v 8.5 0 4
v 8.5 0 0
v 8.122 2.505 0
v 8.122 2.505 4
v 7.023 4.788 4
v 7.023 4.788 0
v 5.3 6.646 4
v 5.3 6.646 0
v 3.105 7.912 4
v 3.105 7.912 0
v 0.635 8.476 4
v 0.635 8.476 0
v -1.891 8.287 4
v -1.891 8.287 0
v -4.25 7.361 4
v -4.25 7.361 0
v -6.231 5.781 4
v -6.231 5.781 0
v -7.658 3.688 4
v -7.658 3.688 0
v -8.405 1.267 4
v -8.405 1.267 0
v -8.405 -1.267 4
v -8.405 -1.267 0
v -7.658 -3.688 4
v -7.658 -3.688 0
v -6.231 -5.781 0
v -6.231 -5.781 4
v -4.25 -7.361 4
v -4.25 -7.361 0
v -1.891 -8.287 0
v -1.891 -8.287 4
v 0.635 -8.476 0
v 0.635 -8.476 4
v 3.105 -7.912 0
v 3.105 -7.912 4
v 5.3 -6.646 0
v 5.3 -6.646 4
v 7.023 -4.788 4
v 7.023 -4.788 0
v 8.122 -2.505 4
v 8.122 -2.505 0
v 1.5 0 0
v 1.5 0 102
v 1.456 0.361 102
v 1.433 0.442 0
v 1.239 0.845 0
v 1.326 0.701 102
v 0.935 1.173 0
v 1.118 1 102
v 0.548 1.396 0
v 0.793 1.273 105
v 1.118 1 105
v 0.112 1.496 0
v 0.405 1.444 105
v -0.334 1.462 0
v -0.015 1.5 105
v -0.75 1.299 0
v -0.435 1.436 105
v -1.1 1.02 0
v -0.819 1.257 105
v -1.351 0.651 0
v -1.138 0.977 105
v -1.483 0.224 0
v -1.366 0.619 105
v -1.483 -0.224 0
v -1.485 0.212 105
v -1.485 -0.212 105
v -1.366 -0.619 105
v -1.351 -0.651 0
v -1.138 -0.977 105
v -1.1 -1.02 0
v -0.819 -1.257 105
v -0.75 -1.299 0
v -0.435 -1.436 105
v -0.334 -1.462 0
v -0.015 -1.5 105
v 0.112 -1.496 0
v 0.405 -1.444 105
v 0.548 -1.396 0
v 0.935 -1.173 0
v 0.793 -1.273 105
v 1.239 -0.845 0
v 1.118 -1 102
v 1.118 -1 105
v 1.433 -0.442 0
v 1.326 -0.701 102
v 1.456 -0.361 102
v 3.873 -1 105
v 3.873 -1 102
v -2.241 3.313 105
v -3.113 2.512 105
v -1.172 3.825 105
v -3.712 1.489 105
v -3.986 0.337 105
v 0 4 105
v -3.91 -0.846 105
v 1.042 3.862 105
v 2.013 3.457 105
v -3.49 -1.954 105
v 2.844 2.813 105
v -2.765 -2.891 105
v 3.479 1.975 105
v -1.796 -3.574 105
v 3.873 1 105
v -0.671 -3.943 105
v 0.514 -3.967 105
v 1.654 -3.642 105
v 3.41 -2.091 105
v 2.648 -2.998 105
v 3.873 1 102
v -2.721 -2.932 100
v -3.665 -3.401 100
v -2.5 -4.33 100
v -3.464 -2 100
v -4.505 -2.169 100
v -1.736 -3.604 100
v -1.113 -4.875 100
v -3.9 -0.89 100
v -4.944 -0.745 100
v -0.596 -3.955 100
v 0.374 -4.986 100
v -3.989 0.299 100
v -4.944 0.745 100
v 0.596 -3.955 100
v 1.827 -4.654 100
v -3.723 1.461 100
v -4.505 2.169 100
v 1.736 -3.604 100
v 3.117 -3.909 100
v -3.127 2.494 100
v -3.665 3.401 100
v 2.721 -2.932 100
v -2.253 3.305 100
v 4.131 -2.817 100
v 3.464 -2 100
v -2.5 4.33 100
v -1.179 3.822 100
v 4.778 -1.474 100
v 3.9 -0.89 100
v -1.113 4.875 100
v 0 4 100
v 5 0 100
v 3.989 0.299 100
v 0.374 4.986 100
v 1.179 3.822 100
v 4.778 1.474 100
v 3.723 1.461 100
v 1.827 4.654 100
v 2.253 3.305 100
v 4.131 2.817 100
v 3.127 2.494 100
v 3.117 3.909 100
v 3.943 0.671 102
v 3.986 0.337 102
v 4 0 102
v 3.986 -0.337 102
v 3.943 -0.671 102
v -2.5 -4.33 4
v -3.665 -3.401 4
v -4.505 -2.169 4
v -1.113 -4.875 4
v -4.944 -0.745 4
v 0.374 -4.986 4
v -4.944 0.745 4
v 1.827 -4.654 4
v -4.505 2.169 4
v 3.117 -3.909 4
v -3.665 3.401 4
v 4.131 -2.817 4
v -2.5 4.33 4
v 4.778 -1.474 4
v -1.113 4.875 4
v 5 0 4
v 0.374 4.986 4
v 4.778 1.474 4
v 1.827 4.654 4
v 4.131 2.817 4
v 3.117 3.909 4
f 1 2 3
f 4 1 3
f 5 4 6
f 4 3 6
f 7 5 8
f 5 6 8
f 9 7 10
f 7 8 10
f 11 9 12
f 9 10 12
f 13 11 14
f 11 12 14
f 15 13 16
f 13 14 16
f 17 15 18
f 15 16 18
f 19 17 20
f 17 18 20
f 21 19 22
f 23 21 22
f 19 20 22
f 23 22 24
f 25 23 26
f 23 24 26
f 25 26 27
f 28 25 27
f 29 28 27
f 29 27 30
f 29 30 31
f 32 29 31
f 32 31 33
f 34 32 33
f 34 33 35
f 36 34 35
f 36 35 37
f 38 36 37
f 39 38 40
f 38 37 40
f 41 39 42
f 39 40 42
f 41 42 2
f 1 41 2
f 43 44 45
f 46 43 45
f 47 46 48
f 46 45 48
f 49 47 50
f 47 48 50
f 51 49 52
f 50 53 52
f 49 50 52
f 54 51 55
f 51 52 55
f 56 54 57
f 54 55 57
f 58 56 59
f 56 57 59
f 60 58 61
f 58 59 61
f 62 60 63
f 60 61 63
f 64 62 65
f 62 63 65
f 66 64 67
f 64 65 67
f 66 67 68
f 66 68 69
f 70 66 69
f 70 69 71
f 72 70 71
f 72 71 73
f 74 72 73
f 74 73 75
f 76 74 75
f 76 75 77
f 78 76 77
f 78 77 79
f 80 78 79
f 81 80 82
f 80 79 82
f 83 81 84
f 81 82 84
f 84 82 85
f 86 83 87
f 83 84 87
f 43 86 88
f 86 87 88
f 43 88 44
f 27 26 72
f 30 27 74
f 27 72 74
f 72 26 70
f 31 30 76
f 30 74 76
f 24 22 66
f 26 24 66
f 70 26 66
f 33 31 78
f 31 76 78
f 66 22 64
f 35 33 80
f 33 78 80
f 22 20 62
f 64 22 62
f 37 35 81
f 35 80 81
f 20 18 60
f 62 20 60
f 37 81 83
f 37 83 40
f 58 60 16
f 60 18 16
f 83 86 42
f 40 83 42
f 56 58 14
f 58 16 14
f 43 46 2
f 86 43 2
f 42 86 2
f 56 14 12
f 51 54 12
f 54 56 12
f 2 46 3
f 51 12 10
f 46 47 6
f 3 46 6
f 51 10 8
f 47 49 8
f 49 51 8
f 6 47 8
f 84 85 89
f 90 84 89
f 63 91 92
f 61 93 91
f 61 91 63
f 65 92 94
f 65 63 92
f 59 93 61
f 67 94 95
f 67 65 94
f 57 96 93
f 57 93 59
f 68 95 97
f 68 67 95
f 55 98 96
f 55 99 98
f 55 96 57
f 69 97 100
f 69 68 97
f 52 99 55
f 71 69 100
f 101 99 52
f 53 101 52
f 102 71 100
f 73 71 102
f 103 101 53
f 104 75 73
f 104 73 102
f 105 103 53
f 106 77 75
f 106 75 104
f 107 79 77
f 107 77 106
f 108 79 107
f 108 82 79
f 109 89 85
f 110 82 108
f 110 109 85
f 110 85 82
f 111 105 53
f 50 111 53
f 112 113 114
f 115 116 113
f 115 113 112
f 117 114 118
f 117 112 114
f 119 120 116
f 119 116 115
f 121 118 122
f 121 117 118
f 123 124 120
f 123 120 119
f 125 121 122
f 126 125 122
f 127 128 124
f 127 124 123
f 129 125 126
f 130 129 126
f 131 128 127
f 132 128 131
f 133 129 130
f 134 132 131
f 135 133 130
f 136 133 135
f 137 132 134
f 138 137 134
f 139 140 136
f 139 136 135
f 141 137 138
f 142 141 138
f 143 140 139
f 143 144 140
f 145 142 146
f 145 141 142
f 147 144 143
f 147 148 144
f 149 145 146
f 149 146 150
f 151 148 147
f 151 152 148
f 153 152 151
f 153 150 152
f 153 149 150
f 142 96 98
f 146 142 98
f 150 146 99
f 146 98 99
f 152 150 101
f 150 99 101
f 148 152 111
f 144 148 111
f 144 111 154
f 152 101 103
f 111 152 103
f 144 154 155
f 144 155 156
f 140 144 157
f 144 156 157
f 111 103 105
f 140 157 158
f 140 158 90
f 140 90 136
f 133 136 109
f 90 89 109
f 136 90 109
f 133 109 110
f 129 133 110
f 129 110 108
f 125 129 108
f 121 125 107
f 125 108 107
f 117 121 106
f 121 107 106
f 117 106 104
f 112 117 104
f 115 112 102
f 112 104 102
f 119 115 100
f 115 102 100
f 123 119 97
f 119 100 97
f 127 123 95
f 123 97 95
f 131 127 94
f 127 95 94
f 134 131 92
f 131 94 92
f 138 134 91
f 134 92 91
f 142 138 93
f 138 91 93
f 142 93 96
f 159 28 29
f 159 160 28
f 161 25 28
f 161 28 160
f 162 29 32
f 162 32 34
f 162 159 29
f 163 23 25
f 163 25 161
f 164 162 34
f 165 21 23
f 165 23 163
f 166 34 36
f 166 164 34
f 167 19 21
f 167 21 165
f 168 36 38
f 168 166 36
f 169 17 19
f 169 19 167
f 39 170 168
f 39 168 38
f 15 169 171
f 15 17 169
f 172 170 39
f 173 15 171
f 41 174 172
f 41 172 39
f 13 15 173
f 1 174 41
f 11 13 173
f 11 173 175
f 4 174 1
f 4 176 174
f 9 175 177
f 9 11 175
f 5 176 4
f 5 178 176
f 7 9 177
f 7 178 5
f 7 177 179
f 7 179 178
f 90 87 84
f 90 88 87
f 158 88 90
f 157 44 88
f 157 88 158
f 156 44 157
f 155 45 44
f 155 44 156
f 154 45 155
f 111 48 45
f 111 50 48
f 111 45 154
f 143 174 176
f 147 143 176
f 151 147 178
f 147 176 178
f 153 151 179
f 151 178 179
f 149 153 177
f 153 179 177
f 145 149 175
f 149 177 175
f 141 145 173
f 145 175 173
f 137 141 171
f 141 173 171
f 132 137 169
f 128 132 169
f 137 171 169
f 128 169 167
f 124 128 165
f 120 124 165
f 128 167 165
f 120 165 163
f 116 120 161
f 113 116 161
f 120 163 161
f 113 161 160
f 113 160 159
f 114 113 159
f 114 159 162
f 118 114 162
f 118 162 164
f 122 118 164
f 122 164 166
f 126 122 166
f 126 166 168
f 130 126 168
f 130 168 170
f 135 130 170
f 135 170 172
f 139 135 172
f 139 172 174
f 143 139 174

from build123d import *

# Parameters (mm, degrees)
F0_R      = 8.5
F1_DEPTH  = 4
F3_R      = 5
F4_DEPTH  = 100
F5_W      = 4
F5_H      = 5
F9_DEPTH  = 3
F10_R     = 1.5
F11_DEPTH = 118.9


with BuildPart() as f1:
    # F0 (on Top) → F1 (new body)
    with BuildSketch(Plane.XY):
        Circle(F0_R)
    extrude(amount=F1_DEPTH)

    # F3 (on Top) → F4 (join)
    with BuildSketch(Plane.XY):
        Circle(F3_R)
    extrude(amount=F4_DEPTH)

    # F5 (on Right) → F6 (revolve)
    with BuildSketch(Plane.YZ):
        with Locations((2, 102.5)):
            Rectangle(F5_W, F5_H)
    revolve(axis=Axis((0, 0, 102.5), (0, 0, -1)))

    # F8 (on face) → F9 (cut)
    with BuildSketch(Plane.XY.offset(105)):
        with BuildLine():
            Line((3.8729833462, 1), (1, 1))
            Line((1, 1), (1, -1))
            Line((1, -1), (3.8729833462, -1))
            ThreePointArc((3.8729833462, -1), (3.9681187851, -0.5040171699), (4, 0))
            ThreePointArc((4, 0), (3.9681187851, 0.5040171699), (3.8729833462, 1))
        make_face()
    extrude(amount=-F9_DEPTH, mode=Mode.SUBTRACT)

    # F10 (on face) → F11 (cut)
    with BuildSketch(Plane.XY.offset(105)):
        Circle(F10_R)
    extrude(amount=-F11_DEPTH, mode=Mode.SUBTRACT)


solid = f1.part
